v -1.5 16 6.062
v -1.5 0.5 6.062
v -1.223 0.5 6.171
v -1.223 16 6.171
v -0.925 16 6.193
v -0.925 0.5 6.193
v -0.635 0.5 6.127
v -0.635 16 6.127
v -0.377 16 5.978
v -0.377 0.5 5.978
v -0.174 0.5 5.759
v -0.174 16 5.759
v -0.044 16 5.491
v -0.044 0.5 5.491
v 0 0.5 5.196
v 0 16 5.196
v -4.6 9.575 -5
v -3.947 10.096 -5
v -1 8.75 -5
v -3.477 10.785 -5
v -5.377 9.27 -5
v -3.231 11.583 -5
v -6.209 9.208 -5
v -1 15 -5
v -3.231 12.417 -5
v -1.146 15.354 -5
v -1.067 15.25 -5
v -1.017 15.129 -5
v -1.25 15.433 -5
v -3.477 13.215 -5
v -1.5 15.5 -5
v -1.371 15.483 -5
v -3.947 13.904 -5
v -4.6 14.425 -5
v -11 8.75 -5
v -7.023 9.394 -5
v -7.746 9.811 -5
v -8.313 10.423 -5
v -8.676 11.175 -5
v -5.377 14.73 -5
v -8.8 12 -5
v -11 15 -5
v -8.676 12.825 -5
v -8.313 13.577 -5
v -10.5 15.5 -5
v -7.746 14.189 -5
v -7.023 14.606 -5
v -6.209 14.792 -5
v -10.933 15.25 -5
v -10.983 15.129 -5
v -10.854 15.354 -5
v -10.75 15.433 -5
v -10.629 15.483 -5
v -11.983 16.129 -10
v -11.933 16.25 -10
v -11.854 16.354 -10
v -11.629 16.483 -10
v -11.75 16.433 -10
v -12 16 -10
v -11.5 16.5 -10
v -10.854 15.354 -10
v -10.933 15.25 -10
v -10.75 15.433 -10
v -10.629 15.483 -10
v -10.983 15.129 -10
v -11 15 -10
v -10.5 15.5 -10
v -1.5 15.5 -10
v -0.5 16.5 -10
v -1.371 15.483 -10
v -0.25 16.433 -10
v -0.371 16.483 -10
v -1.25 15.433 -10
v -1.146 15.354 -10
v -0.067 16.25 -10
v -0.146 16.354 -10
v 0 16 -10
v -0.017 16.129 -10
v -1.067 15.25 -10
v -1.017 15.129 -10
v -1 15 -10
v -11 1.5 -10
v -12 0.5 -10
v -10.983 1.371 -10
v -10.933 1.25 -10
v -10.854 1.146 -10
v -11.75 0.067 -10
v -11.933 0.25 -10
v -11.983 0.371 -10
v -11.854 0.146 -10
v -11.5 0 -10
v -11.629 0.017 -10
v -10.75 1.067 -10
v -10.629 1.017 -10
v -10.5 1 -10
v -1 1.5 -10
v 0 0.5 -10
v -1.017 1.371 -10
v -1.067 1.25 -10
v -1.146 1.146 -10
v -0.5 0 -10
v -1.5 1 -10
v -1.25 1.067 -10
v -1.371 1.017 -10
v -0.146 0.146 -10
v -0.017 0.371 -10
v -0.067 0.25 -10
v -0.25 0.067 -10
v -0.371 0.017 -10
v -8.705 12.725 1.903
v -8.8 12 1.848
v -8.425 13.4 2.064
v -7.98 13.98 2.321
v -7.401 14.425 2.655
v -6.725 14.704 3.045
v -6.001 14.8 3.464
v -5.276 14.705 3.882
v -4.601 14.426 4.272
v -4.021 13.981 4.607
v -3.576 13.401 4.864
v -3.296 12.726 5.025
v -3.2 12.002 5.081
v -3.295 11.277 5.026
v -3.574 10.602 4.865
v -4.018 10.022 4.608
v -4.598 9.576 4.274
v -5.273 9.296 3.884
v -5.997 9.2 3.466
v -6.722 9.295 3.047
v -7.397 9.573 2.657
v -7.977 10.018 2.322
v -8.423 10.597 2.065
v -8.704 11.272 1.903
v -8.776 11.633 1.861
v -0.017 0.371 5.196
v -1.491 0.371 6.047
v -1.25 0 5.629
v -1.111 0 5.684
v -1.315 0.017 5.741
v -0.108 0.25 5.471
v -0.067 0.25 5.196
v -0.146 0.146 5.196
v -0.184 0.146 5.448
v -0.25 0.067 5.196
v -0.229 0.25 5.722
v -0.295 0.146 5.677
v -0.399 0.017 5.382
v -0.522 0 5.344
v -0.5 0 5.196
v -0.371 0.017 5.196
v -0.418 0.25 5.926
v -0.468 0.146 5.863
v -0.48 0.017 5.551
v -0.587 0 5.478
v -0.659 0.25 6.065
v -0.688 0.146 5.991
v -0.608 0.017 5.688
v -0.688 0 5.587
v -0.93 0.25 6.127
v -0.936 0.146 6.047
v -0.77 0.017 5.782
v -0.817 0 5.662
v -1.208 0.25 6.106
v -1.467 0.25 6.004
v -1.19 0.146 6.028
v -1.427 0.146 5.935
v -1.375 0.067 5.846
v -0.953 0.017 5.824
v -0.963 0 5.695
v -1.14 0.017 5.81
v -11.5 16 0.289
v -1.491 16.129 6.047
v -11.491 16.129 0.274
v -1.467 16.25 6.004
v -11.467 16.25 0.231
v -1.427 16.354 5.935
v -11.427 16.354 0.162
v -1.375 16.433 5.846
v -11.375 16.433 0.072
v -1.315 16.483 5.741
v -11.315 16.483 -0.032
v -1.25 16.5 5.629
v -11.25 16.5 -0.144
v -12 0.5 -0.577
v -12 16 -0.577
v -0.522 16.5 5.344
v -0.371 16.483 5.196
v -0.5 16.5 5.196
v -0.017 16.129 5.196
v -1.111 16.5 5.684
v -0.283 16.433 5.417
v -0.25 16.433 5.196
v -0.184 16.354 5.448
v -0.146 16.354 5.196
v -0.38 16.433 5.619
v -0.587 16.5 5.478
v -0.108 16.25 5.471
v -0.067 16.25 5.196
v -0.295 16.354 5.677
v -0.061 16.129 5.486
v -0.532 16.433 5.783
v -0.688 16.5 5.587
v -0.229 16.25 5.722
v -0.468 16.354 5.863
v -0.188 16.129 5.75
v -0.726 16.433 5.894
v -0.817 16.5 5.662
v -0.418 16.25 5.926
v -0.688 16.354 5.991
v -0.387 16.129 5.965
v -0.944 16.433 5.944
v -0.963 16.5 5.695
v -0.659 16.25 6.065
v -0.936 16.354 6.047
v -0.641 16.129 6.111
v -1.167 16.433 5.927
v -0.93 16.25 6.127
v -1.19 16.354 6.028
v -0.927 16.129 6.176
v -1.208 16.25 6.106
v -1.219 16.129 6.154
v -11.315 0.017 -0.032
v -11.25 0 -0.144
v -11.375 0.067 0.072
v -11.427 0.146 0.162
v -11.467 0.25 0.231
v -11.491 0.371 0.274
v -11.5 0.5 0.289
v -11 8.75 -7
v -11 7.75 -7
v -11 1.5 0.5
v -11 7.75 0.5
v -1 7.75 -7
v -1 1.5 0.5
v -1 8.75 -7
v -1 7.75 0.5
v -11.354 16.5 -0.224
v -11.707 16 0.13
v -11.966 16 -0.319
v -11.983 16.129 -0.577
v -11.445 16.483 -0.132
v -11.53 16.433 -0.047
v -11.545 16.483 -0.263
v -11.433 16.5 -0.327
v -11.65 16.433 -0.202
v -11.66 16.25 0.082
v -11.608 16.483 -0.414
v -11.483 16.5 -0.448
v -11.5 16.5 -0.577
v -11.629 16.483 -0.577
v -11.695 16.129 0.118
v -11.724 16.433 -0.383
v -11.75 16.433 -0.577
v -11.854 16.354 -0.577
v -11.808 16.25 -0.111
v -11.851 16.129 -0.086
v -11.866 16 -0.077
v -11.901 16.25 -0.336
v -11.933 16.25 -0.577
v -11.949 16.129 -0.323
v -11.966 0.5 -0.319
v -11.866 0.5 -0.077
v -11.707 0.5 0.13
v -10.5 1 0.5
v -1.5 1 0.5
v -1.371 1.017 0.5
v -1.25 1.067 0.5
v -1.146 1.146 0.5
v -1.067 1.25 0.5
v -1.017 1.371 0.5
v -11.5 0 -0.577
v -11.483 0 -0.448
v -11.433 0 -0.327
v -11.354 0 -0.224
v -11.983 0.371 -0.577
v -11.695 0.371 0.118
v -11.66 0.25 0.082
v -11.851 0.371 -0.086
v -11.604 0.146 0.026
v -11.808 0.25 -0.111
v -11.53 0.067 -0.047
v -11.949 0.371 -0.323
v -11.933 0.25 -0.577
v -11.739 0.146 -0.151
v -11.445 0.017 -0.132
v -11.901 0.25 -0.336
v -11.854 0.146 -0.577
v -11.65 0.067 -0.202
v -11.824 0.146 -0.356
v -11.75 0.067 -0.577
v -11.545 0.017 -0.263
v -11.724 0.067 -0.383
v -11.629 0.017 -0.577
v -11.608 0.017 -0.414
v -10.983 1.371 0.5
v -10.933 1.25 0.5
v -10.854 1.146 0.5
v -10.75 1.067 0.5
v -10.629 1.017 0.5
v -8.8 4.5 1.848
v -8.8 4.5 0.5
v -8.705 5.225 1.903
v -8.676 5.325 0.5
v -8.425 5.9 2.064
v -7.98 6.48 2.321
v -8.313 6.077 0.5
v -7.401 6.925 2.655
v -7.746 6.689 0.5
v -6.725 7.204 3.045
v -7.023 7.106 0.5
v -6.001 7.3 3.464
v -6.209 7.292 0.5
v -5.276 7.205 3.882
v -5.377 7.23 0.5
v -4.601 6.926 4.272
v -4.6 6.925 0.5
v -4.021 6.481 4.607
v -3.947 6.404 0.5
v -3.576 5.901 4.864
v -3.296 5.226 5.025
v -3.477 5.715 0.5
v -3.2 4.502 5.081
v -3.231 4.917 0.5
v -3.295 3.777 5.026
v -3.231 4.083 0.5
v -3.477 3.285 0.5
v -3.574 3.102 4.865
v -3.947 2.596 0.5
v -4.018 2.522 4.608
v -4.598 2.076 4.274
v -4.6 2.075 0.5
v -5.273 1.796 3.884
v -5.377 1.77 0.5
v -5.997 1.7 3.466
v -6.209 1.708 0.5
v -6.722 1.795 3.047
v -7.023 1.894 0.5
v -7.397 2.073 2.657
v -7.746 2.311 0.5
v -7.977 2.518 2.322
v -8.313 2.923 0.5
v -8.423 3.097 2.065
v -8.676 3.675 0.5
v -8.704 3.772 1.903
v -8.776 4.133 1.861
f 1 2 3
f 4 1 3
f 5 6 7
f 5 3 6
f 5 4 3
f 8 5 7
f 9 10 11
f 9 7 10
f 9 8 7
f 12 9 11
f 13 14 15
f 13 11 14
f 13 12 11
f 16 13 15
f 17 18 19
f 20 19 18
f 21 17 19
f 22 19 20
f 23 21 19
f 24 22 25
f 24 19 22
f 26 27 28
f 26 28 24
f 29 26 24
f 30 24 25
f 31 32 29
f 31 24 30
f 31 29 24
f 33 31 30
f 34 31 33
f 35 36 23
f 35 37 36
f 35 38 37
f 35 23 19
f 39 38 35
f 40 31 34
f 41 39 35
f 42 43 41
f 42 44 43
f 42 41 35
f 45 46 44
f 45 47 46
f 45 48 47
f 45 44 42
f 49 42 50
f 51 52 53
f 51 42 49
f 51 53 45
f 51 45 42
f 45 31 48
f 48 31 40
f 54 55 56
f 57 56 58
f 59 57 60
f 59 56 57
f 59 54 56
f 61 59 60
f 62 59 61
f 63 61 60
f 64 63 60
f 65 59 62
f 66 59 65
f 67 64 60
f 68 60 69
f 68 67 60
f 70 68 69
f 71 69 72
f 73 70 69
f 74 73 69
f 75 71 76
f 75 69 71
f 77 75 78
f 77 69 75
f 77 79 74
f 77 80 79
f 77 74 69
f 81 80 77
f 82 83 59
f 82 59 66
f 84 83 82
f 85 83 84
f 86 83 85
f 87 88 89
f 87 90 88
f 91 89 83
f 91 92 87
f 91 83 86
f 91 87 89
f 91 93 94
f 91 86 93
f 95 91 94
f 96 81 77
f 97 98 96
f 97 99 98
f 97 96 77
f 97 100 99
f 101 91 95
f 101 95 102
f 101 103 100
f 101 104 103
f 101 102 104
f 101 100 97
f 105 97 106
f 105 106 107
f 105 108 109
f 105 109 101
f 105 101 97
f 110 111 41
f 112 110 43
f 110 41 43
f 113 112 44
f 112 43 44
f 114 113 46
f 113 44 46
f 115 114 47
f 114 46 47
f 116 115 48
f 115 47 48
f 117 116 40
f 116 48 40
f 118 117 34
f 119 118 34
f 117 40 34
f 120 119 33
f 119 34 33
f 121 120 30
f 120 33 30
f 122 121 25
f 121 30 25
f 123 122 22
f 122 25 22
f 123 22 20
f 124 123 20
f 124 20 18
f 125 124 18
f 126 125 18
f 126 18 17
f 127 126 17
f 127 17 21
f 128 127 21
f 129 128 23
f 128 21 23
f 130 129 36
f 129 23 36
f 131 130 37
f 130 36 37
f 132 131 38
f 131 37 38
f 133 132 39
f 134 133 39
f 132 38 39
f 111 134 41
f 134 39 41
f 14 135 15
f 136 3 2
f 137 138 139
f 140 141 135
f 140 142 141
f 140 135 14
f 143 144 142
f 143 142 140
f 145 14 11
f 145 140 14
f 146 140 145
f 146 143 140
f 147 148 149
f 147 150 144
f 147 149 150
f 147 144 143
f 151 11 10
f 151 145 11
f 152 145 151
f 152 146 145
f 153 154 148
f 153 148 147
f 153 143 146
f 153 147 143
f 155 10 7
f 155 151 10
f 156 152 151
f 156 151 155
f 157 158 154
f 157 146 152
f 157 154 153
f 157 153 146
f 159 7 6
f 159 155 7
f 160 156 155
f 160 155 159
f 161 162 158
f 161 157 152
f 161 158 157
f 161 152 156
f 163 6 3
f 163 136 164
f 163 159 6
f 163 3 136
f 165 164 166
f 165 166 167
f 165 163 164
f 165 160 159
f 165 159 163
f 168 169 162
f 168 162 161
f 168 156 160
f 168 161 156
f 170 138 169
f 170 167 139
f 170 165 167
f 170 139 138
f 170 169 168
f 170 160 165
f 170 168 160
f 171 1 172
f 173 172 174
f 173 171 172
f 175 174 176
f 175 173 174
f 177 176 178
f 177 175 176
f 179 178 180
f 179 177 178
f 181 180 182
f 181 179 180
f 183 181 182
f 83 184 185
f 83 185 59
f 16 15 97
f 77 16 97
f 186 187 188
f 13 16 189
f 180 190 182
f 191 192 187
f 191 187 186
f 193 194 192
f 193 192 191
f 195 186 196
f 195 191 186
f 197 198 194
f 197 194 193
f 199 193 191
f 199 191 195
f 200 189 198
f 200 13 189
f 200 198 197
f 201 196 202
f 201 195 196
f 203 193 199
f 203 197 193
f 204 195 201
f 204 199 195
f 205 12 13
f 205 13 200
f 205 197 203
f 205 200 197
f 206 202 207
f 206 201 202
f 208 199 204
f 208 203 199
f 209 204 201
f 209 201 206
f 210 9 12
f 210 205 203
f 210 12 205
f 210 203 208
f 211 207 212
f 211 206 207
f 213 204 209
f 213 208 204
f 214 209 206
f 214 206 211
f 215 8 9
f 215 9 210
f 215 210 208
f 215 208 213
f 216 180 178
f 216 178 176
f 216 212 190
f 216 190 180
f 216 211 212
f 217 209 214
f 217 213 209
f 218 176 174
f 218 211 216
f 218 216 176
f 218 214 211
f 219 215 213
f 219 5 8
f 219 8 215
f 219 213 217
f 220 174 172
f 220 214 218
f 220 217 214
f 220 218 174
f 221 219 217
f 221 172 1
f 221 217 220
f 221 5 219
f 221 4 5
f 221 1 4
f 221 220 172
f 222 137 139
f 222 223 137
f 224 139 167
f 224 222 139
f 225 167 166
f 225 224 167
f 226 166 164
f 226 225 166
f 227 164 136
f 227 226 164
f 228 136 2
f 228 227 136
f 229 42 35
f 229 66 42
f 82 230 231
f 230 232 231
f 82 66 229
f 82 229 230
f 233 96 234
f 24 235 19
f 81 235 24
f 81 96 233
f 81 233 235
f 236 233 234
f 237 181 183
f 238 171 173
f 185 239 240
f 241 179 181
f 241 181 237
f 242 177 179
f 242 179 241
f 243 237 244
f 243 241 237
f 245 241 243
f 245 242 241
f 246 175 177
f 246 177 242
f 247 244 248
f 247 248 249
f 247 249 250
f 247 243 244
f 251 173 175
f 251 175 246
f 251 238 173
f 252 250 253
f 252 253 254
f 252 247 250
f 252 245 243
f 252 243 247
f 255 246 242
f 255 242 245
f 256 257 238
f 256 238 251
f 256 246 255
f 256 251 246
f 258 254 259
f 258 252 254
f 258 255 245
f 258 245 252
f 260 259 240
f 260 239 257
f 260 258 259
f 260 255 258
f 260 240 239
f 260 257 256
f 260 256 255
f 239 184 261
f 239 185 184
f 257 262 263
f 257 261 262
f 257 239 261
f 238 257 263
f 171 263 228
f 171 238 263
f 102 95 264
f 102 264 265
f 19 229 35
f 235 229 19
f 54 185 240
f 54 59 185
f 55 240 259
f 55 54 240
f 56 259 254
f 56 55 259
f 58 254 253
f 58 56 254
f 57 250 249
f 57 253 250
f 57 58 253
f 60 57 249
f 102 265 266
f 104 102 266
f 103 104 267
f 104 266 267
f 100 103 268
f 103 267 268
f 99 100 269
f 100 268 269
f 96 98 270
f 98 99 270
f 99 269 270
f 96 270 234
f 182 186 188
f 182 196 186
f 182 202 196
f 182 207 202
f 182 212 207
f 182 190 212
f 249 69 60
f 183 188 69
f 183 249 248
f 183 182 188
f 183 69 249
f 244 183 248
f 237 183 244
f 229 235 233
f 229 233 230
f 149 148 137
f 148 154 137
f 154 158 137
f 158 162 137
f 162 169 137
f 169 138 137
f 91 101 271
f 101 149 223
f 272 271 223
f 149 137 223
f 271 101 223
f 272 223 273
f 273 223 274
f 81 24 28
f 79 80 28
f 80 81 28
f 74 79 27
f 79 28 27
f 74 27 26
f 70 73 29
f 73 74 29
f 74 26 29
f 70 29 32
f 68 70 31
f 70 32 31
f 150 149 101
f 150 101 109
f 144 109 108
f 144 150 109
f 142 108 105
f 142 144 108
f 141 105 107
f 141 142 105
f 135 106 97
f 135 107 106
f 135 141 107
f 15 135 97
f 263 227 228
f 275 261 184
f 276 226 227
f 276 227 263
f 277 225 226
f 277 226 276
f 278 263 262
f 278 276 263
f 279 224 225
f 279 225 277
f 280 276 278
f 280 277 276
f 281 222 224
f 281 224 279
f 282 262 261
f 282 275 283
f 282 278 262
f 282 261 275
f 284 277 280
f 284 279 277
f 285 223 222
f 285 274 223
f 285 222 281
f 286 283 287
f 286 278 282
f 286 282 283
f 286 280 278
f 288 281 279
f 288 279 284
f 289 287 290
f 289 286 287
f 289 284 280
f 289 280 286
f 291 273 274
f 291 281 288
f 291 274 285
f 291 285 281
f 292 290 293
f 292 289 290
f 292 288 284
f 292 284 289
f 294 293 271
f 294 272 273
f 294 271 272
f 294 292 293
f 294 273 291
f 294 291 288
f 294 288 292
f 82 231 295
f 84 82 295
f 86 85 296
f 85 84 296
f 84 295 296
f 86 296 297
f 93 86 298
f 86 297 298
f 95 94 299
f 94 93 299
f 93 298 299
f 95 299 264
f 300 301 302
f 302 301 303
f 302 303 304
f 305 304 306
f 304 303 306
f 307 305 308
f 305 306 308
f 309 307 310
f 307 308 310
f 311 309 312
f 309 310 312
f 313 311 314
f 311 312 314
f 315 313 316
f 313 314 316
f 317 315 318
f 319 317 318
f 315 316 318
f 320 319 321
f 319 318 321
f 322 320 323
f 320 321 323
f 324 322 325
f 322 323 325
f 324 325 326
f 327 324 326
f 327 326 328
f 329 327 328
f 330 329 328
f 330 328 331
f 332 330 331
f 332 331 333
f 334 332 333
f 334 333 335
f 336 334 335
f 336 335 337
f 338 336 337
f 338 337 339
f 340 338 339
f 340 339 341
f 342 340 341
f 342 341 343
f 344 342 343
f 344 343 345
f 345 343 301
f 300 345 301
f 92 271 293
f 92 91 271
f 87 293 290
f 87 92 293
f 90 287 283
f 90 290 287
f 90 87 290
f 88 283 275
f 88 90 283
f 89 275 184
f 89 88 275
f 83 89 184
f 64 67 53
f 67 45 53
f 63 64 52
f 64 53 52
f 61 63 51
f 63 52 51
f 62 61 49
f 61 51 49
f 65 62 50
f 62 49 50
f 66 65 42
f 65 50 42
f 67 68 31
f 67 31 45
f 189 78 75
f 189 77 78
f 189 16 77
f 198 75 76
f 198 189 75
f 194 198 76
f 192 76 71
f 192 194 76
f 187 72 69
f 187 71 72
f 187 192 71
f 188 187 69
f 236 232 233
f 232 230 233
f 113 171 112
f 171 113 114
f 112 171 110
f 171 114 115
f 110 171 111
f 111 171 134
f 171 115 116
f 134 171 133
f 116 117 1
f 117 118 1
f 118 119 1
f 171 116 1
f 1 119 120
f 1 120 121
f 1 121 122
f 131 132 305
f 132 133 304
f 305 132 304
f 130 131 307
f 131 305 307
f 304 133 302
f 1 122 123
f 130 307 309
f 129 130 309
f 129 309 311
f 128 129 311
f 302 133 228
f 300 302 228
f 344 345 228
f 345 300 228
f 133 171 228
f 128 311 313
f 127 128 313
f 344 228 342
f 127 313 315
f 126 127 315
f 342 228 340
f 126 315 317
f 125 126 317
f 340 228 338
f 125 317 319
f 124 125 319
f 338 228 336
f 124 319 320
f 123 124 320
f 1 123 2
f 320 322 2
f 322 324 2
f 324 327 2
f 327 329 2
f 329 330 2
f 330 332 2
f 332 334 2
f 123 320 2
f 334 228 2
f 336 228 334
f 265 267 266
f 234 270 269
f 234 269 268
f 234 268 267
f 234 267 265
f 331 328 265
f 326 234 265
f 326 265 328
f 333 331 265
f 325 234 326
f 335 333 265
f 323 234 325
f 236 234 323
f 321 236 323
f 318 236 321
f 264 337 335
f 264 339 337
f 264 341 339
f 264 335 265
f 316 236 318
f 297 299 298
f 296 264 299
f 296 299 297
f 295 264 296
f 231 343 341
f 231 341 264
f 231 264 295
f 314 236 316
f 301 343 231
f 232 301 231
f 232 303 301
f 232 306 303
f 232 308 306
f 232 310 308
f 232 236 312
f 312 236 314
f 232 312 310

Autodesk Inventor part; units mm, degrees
ref_plane "YZ Plane" through (0, 0, 0) normal (1, 0, 0) x (0, 1, 0)
ref_plane "XZ Plane" through (0, 0, 0) normal (0, 1, 0) x (-1, 0, 0)
ref_plane "XY Plane" through (0, 0, 0) normal (0, 0, 1) x (1, 0, 0)
sketch "Sketch1" plane through (0, 0, 0) normal (0, 1, 0) x (-1, 0, 0)
  line L0 (0, 0) -> (12, 0)
  line L1 (12, 0) -> (12, -10)
  line L2 (12, -10) -> (0, -10)
  line L3 (0, -10) -> (0, 0)
  line L4 (12, 0) -> (0, 6.9282)
  line L5 (12, 0) -> (25.8564, 0) construction
  line L6 (0, 6.9282) -> (0, 0)
  dimension "d0" = 10
  dimension "d1" = 12
  dimension "d2" = 150
extrude "Extrusion1" add sketch "Sketch1" along normal blind 16.5
sketch "Sketch2" plane through (0, 0, -10) normal (0, 0, -1) x (-1, 0, 0)
  circle A0 centre (6, 4.5) radius 2.8
  circle A1 centre (6, 12) radius 2.8
  line L0 (0, 0) -> (0, 16.5) projected
  line L1 (0, 0) -> (12, 0) projected
  line L2 (0, 16.5) -> (12, 16.5) projected
  dimension "d5" = 5.6
  dimension "d6" = 6
  dimension "d7" = 4.5
  dimension "d8" = 4.5
extrude "Extrusion2" cut sketch "Sketch2" against normal through all
fillet "Fillet1" radius 1 2 edges at (0, 8.25, 6.9282) (-12, 8.25, 0)
sketch "Sketch3" plane through (0, 0, -10) normal (0, 0, -1) x (-1, 0, 0)
  circle A0 centre (6, 12) radius 2.8 projected
  circle A1 centre (6, 4.5) radius 2.8 projected
  line L0 (0, 0) -> (12, 0) projected
  line L1 (12, 0) -> (12, 16.5) projected
  line L2 (0, 16.5) -> (12, 16.5) projected
  line L3 (0, 0) -> (0, 16.5) projected
  line L4 (11, 15.5) -> (11, 1)
  line L5 (11, 1) -> (1, 1)
  line L6 (1, 1) -> (1, 15.5)
  line L7 (1, 15.5) -> (11, 15.5)
  dimension "d12" = 1
extrude "Extrusion3" cut sketch "Sketch3" against normal blind 3 contours L4 L5 L6 L7
fillet "Fillet2" radius 0.5 14 edges at (-0.5, 16.5, 6.0622) (-6.5, 16.5, 3.1754) (-11.866, 16.5, -0.0774) (-12, 16.5, -5.2887) (0, 16.5, -2.4019) (-0.5, 0, 6.0622) (0, 0, -2.4019) (-11.866, 0, -0.0774) (-12, 0, -5.2887) (-6.5, 0, 3.1754) (-1, 15.5, -8.5) (-11, 15.5, -8.5) (-11, 1, -8.5) (-1, 1, -8.5)
sketch "Sketch4" plane through (0, 0, -7) normal (0, 0, -1) x (-1, 0, 0)
  arc A0 (1, 1.5) -> (1.5, 1) centre (1.5, 1.5) ccw projected
  line L0 (10.5, 1) -> (1.5, 1) projected
  arc A1 (10.5, 1) -> (11, 1.5) centre (10.5, 1.5) ccw projected
  line L1 (11, 15) -> (11, 1.5) projected
  arc A2 (11, 15) -> (10.5, 15.5) centre (10.5, 15) ccw projected
  line L2 (1.5, 15.5) -> (10.5, 15.5) projected
  arc A3 (1.5, 15.5) -> (1, 15) centre (1.5, 15) ccw projected
  line L3 (1, 1.5) -> (1, 15) projected
  circle A4 centre (6, 4.5) radius 2.8 projected
  circle A5 centre (6, 12) radius 2.8 projected
  line L4 (11, 15) -> (11, 1.5) projected
  line L5 (11, 7.75) -> (1, 7.75)
  line L6 (1, 1.5) -> (1, 15) projected
  line L7 (11, 8.75) -> (1, 8.75)
  point P0 (0, 0)
  dimension "d16" = 6.75
  dimension "d17" = 6.75
extrude "Extrusion4" cut sketch "Sketch4" against normal blind 7.5 contours L3 L5 L1 A1 L0 A0
extrude "Extrusion5" cut sketch "Sketch4" against normal blind 2 contours L3 A3 L2 A2 L1 L7
equation "\"d8\" = d7"
properties part number "ProximaCustomCaseFront"
